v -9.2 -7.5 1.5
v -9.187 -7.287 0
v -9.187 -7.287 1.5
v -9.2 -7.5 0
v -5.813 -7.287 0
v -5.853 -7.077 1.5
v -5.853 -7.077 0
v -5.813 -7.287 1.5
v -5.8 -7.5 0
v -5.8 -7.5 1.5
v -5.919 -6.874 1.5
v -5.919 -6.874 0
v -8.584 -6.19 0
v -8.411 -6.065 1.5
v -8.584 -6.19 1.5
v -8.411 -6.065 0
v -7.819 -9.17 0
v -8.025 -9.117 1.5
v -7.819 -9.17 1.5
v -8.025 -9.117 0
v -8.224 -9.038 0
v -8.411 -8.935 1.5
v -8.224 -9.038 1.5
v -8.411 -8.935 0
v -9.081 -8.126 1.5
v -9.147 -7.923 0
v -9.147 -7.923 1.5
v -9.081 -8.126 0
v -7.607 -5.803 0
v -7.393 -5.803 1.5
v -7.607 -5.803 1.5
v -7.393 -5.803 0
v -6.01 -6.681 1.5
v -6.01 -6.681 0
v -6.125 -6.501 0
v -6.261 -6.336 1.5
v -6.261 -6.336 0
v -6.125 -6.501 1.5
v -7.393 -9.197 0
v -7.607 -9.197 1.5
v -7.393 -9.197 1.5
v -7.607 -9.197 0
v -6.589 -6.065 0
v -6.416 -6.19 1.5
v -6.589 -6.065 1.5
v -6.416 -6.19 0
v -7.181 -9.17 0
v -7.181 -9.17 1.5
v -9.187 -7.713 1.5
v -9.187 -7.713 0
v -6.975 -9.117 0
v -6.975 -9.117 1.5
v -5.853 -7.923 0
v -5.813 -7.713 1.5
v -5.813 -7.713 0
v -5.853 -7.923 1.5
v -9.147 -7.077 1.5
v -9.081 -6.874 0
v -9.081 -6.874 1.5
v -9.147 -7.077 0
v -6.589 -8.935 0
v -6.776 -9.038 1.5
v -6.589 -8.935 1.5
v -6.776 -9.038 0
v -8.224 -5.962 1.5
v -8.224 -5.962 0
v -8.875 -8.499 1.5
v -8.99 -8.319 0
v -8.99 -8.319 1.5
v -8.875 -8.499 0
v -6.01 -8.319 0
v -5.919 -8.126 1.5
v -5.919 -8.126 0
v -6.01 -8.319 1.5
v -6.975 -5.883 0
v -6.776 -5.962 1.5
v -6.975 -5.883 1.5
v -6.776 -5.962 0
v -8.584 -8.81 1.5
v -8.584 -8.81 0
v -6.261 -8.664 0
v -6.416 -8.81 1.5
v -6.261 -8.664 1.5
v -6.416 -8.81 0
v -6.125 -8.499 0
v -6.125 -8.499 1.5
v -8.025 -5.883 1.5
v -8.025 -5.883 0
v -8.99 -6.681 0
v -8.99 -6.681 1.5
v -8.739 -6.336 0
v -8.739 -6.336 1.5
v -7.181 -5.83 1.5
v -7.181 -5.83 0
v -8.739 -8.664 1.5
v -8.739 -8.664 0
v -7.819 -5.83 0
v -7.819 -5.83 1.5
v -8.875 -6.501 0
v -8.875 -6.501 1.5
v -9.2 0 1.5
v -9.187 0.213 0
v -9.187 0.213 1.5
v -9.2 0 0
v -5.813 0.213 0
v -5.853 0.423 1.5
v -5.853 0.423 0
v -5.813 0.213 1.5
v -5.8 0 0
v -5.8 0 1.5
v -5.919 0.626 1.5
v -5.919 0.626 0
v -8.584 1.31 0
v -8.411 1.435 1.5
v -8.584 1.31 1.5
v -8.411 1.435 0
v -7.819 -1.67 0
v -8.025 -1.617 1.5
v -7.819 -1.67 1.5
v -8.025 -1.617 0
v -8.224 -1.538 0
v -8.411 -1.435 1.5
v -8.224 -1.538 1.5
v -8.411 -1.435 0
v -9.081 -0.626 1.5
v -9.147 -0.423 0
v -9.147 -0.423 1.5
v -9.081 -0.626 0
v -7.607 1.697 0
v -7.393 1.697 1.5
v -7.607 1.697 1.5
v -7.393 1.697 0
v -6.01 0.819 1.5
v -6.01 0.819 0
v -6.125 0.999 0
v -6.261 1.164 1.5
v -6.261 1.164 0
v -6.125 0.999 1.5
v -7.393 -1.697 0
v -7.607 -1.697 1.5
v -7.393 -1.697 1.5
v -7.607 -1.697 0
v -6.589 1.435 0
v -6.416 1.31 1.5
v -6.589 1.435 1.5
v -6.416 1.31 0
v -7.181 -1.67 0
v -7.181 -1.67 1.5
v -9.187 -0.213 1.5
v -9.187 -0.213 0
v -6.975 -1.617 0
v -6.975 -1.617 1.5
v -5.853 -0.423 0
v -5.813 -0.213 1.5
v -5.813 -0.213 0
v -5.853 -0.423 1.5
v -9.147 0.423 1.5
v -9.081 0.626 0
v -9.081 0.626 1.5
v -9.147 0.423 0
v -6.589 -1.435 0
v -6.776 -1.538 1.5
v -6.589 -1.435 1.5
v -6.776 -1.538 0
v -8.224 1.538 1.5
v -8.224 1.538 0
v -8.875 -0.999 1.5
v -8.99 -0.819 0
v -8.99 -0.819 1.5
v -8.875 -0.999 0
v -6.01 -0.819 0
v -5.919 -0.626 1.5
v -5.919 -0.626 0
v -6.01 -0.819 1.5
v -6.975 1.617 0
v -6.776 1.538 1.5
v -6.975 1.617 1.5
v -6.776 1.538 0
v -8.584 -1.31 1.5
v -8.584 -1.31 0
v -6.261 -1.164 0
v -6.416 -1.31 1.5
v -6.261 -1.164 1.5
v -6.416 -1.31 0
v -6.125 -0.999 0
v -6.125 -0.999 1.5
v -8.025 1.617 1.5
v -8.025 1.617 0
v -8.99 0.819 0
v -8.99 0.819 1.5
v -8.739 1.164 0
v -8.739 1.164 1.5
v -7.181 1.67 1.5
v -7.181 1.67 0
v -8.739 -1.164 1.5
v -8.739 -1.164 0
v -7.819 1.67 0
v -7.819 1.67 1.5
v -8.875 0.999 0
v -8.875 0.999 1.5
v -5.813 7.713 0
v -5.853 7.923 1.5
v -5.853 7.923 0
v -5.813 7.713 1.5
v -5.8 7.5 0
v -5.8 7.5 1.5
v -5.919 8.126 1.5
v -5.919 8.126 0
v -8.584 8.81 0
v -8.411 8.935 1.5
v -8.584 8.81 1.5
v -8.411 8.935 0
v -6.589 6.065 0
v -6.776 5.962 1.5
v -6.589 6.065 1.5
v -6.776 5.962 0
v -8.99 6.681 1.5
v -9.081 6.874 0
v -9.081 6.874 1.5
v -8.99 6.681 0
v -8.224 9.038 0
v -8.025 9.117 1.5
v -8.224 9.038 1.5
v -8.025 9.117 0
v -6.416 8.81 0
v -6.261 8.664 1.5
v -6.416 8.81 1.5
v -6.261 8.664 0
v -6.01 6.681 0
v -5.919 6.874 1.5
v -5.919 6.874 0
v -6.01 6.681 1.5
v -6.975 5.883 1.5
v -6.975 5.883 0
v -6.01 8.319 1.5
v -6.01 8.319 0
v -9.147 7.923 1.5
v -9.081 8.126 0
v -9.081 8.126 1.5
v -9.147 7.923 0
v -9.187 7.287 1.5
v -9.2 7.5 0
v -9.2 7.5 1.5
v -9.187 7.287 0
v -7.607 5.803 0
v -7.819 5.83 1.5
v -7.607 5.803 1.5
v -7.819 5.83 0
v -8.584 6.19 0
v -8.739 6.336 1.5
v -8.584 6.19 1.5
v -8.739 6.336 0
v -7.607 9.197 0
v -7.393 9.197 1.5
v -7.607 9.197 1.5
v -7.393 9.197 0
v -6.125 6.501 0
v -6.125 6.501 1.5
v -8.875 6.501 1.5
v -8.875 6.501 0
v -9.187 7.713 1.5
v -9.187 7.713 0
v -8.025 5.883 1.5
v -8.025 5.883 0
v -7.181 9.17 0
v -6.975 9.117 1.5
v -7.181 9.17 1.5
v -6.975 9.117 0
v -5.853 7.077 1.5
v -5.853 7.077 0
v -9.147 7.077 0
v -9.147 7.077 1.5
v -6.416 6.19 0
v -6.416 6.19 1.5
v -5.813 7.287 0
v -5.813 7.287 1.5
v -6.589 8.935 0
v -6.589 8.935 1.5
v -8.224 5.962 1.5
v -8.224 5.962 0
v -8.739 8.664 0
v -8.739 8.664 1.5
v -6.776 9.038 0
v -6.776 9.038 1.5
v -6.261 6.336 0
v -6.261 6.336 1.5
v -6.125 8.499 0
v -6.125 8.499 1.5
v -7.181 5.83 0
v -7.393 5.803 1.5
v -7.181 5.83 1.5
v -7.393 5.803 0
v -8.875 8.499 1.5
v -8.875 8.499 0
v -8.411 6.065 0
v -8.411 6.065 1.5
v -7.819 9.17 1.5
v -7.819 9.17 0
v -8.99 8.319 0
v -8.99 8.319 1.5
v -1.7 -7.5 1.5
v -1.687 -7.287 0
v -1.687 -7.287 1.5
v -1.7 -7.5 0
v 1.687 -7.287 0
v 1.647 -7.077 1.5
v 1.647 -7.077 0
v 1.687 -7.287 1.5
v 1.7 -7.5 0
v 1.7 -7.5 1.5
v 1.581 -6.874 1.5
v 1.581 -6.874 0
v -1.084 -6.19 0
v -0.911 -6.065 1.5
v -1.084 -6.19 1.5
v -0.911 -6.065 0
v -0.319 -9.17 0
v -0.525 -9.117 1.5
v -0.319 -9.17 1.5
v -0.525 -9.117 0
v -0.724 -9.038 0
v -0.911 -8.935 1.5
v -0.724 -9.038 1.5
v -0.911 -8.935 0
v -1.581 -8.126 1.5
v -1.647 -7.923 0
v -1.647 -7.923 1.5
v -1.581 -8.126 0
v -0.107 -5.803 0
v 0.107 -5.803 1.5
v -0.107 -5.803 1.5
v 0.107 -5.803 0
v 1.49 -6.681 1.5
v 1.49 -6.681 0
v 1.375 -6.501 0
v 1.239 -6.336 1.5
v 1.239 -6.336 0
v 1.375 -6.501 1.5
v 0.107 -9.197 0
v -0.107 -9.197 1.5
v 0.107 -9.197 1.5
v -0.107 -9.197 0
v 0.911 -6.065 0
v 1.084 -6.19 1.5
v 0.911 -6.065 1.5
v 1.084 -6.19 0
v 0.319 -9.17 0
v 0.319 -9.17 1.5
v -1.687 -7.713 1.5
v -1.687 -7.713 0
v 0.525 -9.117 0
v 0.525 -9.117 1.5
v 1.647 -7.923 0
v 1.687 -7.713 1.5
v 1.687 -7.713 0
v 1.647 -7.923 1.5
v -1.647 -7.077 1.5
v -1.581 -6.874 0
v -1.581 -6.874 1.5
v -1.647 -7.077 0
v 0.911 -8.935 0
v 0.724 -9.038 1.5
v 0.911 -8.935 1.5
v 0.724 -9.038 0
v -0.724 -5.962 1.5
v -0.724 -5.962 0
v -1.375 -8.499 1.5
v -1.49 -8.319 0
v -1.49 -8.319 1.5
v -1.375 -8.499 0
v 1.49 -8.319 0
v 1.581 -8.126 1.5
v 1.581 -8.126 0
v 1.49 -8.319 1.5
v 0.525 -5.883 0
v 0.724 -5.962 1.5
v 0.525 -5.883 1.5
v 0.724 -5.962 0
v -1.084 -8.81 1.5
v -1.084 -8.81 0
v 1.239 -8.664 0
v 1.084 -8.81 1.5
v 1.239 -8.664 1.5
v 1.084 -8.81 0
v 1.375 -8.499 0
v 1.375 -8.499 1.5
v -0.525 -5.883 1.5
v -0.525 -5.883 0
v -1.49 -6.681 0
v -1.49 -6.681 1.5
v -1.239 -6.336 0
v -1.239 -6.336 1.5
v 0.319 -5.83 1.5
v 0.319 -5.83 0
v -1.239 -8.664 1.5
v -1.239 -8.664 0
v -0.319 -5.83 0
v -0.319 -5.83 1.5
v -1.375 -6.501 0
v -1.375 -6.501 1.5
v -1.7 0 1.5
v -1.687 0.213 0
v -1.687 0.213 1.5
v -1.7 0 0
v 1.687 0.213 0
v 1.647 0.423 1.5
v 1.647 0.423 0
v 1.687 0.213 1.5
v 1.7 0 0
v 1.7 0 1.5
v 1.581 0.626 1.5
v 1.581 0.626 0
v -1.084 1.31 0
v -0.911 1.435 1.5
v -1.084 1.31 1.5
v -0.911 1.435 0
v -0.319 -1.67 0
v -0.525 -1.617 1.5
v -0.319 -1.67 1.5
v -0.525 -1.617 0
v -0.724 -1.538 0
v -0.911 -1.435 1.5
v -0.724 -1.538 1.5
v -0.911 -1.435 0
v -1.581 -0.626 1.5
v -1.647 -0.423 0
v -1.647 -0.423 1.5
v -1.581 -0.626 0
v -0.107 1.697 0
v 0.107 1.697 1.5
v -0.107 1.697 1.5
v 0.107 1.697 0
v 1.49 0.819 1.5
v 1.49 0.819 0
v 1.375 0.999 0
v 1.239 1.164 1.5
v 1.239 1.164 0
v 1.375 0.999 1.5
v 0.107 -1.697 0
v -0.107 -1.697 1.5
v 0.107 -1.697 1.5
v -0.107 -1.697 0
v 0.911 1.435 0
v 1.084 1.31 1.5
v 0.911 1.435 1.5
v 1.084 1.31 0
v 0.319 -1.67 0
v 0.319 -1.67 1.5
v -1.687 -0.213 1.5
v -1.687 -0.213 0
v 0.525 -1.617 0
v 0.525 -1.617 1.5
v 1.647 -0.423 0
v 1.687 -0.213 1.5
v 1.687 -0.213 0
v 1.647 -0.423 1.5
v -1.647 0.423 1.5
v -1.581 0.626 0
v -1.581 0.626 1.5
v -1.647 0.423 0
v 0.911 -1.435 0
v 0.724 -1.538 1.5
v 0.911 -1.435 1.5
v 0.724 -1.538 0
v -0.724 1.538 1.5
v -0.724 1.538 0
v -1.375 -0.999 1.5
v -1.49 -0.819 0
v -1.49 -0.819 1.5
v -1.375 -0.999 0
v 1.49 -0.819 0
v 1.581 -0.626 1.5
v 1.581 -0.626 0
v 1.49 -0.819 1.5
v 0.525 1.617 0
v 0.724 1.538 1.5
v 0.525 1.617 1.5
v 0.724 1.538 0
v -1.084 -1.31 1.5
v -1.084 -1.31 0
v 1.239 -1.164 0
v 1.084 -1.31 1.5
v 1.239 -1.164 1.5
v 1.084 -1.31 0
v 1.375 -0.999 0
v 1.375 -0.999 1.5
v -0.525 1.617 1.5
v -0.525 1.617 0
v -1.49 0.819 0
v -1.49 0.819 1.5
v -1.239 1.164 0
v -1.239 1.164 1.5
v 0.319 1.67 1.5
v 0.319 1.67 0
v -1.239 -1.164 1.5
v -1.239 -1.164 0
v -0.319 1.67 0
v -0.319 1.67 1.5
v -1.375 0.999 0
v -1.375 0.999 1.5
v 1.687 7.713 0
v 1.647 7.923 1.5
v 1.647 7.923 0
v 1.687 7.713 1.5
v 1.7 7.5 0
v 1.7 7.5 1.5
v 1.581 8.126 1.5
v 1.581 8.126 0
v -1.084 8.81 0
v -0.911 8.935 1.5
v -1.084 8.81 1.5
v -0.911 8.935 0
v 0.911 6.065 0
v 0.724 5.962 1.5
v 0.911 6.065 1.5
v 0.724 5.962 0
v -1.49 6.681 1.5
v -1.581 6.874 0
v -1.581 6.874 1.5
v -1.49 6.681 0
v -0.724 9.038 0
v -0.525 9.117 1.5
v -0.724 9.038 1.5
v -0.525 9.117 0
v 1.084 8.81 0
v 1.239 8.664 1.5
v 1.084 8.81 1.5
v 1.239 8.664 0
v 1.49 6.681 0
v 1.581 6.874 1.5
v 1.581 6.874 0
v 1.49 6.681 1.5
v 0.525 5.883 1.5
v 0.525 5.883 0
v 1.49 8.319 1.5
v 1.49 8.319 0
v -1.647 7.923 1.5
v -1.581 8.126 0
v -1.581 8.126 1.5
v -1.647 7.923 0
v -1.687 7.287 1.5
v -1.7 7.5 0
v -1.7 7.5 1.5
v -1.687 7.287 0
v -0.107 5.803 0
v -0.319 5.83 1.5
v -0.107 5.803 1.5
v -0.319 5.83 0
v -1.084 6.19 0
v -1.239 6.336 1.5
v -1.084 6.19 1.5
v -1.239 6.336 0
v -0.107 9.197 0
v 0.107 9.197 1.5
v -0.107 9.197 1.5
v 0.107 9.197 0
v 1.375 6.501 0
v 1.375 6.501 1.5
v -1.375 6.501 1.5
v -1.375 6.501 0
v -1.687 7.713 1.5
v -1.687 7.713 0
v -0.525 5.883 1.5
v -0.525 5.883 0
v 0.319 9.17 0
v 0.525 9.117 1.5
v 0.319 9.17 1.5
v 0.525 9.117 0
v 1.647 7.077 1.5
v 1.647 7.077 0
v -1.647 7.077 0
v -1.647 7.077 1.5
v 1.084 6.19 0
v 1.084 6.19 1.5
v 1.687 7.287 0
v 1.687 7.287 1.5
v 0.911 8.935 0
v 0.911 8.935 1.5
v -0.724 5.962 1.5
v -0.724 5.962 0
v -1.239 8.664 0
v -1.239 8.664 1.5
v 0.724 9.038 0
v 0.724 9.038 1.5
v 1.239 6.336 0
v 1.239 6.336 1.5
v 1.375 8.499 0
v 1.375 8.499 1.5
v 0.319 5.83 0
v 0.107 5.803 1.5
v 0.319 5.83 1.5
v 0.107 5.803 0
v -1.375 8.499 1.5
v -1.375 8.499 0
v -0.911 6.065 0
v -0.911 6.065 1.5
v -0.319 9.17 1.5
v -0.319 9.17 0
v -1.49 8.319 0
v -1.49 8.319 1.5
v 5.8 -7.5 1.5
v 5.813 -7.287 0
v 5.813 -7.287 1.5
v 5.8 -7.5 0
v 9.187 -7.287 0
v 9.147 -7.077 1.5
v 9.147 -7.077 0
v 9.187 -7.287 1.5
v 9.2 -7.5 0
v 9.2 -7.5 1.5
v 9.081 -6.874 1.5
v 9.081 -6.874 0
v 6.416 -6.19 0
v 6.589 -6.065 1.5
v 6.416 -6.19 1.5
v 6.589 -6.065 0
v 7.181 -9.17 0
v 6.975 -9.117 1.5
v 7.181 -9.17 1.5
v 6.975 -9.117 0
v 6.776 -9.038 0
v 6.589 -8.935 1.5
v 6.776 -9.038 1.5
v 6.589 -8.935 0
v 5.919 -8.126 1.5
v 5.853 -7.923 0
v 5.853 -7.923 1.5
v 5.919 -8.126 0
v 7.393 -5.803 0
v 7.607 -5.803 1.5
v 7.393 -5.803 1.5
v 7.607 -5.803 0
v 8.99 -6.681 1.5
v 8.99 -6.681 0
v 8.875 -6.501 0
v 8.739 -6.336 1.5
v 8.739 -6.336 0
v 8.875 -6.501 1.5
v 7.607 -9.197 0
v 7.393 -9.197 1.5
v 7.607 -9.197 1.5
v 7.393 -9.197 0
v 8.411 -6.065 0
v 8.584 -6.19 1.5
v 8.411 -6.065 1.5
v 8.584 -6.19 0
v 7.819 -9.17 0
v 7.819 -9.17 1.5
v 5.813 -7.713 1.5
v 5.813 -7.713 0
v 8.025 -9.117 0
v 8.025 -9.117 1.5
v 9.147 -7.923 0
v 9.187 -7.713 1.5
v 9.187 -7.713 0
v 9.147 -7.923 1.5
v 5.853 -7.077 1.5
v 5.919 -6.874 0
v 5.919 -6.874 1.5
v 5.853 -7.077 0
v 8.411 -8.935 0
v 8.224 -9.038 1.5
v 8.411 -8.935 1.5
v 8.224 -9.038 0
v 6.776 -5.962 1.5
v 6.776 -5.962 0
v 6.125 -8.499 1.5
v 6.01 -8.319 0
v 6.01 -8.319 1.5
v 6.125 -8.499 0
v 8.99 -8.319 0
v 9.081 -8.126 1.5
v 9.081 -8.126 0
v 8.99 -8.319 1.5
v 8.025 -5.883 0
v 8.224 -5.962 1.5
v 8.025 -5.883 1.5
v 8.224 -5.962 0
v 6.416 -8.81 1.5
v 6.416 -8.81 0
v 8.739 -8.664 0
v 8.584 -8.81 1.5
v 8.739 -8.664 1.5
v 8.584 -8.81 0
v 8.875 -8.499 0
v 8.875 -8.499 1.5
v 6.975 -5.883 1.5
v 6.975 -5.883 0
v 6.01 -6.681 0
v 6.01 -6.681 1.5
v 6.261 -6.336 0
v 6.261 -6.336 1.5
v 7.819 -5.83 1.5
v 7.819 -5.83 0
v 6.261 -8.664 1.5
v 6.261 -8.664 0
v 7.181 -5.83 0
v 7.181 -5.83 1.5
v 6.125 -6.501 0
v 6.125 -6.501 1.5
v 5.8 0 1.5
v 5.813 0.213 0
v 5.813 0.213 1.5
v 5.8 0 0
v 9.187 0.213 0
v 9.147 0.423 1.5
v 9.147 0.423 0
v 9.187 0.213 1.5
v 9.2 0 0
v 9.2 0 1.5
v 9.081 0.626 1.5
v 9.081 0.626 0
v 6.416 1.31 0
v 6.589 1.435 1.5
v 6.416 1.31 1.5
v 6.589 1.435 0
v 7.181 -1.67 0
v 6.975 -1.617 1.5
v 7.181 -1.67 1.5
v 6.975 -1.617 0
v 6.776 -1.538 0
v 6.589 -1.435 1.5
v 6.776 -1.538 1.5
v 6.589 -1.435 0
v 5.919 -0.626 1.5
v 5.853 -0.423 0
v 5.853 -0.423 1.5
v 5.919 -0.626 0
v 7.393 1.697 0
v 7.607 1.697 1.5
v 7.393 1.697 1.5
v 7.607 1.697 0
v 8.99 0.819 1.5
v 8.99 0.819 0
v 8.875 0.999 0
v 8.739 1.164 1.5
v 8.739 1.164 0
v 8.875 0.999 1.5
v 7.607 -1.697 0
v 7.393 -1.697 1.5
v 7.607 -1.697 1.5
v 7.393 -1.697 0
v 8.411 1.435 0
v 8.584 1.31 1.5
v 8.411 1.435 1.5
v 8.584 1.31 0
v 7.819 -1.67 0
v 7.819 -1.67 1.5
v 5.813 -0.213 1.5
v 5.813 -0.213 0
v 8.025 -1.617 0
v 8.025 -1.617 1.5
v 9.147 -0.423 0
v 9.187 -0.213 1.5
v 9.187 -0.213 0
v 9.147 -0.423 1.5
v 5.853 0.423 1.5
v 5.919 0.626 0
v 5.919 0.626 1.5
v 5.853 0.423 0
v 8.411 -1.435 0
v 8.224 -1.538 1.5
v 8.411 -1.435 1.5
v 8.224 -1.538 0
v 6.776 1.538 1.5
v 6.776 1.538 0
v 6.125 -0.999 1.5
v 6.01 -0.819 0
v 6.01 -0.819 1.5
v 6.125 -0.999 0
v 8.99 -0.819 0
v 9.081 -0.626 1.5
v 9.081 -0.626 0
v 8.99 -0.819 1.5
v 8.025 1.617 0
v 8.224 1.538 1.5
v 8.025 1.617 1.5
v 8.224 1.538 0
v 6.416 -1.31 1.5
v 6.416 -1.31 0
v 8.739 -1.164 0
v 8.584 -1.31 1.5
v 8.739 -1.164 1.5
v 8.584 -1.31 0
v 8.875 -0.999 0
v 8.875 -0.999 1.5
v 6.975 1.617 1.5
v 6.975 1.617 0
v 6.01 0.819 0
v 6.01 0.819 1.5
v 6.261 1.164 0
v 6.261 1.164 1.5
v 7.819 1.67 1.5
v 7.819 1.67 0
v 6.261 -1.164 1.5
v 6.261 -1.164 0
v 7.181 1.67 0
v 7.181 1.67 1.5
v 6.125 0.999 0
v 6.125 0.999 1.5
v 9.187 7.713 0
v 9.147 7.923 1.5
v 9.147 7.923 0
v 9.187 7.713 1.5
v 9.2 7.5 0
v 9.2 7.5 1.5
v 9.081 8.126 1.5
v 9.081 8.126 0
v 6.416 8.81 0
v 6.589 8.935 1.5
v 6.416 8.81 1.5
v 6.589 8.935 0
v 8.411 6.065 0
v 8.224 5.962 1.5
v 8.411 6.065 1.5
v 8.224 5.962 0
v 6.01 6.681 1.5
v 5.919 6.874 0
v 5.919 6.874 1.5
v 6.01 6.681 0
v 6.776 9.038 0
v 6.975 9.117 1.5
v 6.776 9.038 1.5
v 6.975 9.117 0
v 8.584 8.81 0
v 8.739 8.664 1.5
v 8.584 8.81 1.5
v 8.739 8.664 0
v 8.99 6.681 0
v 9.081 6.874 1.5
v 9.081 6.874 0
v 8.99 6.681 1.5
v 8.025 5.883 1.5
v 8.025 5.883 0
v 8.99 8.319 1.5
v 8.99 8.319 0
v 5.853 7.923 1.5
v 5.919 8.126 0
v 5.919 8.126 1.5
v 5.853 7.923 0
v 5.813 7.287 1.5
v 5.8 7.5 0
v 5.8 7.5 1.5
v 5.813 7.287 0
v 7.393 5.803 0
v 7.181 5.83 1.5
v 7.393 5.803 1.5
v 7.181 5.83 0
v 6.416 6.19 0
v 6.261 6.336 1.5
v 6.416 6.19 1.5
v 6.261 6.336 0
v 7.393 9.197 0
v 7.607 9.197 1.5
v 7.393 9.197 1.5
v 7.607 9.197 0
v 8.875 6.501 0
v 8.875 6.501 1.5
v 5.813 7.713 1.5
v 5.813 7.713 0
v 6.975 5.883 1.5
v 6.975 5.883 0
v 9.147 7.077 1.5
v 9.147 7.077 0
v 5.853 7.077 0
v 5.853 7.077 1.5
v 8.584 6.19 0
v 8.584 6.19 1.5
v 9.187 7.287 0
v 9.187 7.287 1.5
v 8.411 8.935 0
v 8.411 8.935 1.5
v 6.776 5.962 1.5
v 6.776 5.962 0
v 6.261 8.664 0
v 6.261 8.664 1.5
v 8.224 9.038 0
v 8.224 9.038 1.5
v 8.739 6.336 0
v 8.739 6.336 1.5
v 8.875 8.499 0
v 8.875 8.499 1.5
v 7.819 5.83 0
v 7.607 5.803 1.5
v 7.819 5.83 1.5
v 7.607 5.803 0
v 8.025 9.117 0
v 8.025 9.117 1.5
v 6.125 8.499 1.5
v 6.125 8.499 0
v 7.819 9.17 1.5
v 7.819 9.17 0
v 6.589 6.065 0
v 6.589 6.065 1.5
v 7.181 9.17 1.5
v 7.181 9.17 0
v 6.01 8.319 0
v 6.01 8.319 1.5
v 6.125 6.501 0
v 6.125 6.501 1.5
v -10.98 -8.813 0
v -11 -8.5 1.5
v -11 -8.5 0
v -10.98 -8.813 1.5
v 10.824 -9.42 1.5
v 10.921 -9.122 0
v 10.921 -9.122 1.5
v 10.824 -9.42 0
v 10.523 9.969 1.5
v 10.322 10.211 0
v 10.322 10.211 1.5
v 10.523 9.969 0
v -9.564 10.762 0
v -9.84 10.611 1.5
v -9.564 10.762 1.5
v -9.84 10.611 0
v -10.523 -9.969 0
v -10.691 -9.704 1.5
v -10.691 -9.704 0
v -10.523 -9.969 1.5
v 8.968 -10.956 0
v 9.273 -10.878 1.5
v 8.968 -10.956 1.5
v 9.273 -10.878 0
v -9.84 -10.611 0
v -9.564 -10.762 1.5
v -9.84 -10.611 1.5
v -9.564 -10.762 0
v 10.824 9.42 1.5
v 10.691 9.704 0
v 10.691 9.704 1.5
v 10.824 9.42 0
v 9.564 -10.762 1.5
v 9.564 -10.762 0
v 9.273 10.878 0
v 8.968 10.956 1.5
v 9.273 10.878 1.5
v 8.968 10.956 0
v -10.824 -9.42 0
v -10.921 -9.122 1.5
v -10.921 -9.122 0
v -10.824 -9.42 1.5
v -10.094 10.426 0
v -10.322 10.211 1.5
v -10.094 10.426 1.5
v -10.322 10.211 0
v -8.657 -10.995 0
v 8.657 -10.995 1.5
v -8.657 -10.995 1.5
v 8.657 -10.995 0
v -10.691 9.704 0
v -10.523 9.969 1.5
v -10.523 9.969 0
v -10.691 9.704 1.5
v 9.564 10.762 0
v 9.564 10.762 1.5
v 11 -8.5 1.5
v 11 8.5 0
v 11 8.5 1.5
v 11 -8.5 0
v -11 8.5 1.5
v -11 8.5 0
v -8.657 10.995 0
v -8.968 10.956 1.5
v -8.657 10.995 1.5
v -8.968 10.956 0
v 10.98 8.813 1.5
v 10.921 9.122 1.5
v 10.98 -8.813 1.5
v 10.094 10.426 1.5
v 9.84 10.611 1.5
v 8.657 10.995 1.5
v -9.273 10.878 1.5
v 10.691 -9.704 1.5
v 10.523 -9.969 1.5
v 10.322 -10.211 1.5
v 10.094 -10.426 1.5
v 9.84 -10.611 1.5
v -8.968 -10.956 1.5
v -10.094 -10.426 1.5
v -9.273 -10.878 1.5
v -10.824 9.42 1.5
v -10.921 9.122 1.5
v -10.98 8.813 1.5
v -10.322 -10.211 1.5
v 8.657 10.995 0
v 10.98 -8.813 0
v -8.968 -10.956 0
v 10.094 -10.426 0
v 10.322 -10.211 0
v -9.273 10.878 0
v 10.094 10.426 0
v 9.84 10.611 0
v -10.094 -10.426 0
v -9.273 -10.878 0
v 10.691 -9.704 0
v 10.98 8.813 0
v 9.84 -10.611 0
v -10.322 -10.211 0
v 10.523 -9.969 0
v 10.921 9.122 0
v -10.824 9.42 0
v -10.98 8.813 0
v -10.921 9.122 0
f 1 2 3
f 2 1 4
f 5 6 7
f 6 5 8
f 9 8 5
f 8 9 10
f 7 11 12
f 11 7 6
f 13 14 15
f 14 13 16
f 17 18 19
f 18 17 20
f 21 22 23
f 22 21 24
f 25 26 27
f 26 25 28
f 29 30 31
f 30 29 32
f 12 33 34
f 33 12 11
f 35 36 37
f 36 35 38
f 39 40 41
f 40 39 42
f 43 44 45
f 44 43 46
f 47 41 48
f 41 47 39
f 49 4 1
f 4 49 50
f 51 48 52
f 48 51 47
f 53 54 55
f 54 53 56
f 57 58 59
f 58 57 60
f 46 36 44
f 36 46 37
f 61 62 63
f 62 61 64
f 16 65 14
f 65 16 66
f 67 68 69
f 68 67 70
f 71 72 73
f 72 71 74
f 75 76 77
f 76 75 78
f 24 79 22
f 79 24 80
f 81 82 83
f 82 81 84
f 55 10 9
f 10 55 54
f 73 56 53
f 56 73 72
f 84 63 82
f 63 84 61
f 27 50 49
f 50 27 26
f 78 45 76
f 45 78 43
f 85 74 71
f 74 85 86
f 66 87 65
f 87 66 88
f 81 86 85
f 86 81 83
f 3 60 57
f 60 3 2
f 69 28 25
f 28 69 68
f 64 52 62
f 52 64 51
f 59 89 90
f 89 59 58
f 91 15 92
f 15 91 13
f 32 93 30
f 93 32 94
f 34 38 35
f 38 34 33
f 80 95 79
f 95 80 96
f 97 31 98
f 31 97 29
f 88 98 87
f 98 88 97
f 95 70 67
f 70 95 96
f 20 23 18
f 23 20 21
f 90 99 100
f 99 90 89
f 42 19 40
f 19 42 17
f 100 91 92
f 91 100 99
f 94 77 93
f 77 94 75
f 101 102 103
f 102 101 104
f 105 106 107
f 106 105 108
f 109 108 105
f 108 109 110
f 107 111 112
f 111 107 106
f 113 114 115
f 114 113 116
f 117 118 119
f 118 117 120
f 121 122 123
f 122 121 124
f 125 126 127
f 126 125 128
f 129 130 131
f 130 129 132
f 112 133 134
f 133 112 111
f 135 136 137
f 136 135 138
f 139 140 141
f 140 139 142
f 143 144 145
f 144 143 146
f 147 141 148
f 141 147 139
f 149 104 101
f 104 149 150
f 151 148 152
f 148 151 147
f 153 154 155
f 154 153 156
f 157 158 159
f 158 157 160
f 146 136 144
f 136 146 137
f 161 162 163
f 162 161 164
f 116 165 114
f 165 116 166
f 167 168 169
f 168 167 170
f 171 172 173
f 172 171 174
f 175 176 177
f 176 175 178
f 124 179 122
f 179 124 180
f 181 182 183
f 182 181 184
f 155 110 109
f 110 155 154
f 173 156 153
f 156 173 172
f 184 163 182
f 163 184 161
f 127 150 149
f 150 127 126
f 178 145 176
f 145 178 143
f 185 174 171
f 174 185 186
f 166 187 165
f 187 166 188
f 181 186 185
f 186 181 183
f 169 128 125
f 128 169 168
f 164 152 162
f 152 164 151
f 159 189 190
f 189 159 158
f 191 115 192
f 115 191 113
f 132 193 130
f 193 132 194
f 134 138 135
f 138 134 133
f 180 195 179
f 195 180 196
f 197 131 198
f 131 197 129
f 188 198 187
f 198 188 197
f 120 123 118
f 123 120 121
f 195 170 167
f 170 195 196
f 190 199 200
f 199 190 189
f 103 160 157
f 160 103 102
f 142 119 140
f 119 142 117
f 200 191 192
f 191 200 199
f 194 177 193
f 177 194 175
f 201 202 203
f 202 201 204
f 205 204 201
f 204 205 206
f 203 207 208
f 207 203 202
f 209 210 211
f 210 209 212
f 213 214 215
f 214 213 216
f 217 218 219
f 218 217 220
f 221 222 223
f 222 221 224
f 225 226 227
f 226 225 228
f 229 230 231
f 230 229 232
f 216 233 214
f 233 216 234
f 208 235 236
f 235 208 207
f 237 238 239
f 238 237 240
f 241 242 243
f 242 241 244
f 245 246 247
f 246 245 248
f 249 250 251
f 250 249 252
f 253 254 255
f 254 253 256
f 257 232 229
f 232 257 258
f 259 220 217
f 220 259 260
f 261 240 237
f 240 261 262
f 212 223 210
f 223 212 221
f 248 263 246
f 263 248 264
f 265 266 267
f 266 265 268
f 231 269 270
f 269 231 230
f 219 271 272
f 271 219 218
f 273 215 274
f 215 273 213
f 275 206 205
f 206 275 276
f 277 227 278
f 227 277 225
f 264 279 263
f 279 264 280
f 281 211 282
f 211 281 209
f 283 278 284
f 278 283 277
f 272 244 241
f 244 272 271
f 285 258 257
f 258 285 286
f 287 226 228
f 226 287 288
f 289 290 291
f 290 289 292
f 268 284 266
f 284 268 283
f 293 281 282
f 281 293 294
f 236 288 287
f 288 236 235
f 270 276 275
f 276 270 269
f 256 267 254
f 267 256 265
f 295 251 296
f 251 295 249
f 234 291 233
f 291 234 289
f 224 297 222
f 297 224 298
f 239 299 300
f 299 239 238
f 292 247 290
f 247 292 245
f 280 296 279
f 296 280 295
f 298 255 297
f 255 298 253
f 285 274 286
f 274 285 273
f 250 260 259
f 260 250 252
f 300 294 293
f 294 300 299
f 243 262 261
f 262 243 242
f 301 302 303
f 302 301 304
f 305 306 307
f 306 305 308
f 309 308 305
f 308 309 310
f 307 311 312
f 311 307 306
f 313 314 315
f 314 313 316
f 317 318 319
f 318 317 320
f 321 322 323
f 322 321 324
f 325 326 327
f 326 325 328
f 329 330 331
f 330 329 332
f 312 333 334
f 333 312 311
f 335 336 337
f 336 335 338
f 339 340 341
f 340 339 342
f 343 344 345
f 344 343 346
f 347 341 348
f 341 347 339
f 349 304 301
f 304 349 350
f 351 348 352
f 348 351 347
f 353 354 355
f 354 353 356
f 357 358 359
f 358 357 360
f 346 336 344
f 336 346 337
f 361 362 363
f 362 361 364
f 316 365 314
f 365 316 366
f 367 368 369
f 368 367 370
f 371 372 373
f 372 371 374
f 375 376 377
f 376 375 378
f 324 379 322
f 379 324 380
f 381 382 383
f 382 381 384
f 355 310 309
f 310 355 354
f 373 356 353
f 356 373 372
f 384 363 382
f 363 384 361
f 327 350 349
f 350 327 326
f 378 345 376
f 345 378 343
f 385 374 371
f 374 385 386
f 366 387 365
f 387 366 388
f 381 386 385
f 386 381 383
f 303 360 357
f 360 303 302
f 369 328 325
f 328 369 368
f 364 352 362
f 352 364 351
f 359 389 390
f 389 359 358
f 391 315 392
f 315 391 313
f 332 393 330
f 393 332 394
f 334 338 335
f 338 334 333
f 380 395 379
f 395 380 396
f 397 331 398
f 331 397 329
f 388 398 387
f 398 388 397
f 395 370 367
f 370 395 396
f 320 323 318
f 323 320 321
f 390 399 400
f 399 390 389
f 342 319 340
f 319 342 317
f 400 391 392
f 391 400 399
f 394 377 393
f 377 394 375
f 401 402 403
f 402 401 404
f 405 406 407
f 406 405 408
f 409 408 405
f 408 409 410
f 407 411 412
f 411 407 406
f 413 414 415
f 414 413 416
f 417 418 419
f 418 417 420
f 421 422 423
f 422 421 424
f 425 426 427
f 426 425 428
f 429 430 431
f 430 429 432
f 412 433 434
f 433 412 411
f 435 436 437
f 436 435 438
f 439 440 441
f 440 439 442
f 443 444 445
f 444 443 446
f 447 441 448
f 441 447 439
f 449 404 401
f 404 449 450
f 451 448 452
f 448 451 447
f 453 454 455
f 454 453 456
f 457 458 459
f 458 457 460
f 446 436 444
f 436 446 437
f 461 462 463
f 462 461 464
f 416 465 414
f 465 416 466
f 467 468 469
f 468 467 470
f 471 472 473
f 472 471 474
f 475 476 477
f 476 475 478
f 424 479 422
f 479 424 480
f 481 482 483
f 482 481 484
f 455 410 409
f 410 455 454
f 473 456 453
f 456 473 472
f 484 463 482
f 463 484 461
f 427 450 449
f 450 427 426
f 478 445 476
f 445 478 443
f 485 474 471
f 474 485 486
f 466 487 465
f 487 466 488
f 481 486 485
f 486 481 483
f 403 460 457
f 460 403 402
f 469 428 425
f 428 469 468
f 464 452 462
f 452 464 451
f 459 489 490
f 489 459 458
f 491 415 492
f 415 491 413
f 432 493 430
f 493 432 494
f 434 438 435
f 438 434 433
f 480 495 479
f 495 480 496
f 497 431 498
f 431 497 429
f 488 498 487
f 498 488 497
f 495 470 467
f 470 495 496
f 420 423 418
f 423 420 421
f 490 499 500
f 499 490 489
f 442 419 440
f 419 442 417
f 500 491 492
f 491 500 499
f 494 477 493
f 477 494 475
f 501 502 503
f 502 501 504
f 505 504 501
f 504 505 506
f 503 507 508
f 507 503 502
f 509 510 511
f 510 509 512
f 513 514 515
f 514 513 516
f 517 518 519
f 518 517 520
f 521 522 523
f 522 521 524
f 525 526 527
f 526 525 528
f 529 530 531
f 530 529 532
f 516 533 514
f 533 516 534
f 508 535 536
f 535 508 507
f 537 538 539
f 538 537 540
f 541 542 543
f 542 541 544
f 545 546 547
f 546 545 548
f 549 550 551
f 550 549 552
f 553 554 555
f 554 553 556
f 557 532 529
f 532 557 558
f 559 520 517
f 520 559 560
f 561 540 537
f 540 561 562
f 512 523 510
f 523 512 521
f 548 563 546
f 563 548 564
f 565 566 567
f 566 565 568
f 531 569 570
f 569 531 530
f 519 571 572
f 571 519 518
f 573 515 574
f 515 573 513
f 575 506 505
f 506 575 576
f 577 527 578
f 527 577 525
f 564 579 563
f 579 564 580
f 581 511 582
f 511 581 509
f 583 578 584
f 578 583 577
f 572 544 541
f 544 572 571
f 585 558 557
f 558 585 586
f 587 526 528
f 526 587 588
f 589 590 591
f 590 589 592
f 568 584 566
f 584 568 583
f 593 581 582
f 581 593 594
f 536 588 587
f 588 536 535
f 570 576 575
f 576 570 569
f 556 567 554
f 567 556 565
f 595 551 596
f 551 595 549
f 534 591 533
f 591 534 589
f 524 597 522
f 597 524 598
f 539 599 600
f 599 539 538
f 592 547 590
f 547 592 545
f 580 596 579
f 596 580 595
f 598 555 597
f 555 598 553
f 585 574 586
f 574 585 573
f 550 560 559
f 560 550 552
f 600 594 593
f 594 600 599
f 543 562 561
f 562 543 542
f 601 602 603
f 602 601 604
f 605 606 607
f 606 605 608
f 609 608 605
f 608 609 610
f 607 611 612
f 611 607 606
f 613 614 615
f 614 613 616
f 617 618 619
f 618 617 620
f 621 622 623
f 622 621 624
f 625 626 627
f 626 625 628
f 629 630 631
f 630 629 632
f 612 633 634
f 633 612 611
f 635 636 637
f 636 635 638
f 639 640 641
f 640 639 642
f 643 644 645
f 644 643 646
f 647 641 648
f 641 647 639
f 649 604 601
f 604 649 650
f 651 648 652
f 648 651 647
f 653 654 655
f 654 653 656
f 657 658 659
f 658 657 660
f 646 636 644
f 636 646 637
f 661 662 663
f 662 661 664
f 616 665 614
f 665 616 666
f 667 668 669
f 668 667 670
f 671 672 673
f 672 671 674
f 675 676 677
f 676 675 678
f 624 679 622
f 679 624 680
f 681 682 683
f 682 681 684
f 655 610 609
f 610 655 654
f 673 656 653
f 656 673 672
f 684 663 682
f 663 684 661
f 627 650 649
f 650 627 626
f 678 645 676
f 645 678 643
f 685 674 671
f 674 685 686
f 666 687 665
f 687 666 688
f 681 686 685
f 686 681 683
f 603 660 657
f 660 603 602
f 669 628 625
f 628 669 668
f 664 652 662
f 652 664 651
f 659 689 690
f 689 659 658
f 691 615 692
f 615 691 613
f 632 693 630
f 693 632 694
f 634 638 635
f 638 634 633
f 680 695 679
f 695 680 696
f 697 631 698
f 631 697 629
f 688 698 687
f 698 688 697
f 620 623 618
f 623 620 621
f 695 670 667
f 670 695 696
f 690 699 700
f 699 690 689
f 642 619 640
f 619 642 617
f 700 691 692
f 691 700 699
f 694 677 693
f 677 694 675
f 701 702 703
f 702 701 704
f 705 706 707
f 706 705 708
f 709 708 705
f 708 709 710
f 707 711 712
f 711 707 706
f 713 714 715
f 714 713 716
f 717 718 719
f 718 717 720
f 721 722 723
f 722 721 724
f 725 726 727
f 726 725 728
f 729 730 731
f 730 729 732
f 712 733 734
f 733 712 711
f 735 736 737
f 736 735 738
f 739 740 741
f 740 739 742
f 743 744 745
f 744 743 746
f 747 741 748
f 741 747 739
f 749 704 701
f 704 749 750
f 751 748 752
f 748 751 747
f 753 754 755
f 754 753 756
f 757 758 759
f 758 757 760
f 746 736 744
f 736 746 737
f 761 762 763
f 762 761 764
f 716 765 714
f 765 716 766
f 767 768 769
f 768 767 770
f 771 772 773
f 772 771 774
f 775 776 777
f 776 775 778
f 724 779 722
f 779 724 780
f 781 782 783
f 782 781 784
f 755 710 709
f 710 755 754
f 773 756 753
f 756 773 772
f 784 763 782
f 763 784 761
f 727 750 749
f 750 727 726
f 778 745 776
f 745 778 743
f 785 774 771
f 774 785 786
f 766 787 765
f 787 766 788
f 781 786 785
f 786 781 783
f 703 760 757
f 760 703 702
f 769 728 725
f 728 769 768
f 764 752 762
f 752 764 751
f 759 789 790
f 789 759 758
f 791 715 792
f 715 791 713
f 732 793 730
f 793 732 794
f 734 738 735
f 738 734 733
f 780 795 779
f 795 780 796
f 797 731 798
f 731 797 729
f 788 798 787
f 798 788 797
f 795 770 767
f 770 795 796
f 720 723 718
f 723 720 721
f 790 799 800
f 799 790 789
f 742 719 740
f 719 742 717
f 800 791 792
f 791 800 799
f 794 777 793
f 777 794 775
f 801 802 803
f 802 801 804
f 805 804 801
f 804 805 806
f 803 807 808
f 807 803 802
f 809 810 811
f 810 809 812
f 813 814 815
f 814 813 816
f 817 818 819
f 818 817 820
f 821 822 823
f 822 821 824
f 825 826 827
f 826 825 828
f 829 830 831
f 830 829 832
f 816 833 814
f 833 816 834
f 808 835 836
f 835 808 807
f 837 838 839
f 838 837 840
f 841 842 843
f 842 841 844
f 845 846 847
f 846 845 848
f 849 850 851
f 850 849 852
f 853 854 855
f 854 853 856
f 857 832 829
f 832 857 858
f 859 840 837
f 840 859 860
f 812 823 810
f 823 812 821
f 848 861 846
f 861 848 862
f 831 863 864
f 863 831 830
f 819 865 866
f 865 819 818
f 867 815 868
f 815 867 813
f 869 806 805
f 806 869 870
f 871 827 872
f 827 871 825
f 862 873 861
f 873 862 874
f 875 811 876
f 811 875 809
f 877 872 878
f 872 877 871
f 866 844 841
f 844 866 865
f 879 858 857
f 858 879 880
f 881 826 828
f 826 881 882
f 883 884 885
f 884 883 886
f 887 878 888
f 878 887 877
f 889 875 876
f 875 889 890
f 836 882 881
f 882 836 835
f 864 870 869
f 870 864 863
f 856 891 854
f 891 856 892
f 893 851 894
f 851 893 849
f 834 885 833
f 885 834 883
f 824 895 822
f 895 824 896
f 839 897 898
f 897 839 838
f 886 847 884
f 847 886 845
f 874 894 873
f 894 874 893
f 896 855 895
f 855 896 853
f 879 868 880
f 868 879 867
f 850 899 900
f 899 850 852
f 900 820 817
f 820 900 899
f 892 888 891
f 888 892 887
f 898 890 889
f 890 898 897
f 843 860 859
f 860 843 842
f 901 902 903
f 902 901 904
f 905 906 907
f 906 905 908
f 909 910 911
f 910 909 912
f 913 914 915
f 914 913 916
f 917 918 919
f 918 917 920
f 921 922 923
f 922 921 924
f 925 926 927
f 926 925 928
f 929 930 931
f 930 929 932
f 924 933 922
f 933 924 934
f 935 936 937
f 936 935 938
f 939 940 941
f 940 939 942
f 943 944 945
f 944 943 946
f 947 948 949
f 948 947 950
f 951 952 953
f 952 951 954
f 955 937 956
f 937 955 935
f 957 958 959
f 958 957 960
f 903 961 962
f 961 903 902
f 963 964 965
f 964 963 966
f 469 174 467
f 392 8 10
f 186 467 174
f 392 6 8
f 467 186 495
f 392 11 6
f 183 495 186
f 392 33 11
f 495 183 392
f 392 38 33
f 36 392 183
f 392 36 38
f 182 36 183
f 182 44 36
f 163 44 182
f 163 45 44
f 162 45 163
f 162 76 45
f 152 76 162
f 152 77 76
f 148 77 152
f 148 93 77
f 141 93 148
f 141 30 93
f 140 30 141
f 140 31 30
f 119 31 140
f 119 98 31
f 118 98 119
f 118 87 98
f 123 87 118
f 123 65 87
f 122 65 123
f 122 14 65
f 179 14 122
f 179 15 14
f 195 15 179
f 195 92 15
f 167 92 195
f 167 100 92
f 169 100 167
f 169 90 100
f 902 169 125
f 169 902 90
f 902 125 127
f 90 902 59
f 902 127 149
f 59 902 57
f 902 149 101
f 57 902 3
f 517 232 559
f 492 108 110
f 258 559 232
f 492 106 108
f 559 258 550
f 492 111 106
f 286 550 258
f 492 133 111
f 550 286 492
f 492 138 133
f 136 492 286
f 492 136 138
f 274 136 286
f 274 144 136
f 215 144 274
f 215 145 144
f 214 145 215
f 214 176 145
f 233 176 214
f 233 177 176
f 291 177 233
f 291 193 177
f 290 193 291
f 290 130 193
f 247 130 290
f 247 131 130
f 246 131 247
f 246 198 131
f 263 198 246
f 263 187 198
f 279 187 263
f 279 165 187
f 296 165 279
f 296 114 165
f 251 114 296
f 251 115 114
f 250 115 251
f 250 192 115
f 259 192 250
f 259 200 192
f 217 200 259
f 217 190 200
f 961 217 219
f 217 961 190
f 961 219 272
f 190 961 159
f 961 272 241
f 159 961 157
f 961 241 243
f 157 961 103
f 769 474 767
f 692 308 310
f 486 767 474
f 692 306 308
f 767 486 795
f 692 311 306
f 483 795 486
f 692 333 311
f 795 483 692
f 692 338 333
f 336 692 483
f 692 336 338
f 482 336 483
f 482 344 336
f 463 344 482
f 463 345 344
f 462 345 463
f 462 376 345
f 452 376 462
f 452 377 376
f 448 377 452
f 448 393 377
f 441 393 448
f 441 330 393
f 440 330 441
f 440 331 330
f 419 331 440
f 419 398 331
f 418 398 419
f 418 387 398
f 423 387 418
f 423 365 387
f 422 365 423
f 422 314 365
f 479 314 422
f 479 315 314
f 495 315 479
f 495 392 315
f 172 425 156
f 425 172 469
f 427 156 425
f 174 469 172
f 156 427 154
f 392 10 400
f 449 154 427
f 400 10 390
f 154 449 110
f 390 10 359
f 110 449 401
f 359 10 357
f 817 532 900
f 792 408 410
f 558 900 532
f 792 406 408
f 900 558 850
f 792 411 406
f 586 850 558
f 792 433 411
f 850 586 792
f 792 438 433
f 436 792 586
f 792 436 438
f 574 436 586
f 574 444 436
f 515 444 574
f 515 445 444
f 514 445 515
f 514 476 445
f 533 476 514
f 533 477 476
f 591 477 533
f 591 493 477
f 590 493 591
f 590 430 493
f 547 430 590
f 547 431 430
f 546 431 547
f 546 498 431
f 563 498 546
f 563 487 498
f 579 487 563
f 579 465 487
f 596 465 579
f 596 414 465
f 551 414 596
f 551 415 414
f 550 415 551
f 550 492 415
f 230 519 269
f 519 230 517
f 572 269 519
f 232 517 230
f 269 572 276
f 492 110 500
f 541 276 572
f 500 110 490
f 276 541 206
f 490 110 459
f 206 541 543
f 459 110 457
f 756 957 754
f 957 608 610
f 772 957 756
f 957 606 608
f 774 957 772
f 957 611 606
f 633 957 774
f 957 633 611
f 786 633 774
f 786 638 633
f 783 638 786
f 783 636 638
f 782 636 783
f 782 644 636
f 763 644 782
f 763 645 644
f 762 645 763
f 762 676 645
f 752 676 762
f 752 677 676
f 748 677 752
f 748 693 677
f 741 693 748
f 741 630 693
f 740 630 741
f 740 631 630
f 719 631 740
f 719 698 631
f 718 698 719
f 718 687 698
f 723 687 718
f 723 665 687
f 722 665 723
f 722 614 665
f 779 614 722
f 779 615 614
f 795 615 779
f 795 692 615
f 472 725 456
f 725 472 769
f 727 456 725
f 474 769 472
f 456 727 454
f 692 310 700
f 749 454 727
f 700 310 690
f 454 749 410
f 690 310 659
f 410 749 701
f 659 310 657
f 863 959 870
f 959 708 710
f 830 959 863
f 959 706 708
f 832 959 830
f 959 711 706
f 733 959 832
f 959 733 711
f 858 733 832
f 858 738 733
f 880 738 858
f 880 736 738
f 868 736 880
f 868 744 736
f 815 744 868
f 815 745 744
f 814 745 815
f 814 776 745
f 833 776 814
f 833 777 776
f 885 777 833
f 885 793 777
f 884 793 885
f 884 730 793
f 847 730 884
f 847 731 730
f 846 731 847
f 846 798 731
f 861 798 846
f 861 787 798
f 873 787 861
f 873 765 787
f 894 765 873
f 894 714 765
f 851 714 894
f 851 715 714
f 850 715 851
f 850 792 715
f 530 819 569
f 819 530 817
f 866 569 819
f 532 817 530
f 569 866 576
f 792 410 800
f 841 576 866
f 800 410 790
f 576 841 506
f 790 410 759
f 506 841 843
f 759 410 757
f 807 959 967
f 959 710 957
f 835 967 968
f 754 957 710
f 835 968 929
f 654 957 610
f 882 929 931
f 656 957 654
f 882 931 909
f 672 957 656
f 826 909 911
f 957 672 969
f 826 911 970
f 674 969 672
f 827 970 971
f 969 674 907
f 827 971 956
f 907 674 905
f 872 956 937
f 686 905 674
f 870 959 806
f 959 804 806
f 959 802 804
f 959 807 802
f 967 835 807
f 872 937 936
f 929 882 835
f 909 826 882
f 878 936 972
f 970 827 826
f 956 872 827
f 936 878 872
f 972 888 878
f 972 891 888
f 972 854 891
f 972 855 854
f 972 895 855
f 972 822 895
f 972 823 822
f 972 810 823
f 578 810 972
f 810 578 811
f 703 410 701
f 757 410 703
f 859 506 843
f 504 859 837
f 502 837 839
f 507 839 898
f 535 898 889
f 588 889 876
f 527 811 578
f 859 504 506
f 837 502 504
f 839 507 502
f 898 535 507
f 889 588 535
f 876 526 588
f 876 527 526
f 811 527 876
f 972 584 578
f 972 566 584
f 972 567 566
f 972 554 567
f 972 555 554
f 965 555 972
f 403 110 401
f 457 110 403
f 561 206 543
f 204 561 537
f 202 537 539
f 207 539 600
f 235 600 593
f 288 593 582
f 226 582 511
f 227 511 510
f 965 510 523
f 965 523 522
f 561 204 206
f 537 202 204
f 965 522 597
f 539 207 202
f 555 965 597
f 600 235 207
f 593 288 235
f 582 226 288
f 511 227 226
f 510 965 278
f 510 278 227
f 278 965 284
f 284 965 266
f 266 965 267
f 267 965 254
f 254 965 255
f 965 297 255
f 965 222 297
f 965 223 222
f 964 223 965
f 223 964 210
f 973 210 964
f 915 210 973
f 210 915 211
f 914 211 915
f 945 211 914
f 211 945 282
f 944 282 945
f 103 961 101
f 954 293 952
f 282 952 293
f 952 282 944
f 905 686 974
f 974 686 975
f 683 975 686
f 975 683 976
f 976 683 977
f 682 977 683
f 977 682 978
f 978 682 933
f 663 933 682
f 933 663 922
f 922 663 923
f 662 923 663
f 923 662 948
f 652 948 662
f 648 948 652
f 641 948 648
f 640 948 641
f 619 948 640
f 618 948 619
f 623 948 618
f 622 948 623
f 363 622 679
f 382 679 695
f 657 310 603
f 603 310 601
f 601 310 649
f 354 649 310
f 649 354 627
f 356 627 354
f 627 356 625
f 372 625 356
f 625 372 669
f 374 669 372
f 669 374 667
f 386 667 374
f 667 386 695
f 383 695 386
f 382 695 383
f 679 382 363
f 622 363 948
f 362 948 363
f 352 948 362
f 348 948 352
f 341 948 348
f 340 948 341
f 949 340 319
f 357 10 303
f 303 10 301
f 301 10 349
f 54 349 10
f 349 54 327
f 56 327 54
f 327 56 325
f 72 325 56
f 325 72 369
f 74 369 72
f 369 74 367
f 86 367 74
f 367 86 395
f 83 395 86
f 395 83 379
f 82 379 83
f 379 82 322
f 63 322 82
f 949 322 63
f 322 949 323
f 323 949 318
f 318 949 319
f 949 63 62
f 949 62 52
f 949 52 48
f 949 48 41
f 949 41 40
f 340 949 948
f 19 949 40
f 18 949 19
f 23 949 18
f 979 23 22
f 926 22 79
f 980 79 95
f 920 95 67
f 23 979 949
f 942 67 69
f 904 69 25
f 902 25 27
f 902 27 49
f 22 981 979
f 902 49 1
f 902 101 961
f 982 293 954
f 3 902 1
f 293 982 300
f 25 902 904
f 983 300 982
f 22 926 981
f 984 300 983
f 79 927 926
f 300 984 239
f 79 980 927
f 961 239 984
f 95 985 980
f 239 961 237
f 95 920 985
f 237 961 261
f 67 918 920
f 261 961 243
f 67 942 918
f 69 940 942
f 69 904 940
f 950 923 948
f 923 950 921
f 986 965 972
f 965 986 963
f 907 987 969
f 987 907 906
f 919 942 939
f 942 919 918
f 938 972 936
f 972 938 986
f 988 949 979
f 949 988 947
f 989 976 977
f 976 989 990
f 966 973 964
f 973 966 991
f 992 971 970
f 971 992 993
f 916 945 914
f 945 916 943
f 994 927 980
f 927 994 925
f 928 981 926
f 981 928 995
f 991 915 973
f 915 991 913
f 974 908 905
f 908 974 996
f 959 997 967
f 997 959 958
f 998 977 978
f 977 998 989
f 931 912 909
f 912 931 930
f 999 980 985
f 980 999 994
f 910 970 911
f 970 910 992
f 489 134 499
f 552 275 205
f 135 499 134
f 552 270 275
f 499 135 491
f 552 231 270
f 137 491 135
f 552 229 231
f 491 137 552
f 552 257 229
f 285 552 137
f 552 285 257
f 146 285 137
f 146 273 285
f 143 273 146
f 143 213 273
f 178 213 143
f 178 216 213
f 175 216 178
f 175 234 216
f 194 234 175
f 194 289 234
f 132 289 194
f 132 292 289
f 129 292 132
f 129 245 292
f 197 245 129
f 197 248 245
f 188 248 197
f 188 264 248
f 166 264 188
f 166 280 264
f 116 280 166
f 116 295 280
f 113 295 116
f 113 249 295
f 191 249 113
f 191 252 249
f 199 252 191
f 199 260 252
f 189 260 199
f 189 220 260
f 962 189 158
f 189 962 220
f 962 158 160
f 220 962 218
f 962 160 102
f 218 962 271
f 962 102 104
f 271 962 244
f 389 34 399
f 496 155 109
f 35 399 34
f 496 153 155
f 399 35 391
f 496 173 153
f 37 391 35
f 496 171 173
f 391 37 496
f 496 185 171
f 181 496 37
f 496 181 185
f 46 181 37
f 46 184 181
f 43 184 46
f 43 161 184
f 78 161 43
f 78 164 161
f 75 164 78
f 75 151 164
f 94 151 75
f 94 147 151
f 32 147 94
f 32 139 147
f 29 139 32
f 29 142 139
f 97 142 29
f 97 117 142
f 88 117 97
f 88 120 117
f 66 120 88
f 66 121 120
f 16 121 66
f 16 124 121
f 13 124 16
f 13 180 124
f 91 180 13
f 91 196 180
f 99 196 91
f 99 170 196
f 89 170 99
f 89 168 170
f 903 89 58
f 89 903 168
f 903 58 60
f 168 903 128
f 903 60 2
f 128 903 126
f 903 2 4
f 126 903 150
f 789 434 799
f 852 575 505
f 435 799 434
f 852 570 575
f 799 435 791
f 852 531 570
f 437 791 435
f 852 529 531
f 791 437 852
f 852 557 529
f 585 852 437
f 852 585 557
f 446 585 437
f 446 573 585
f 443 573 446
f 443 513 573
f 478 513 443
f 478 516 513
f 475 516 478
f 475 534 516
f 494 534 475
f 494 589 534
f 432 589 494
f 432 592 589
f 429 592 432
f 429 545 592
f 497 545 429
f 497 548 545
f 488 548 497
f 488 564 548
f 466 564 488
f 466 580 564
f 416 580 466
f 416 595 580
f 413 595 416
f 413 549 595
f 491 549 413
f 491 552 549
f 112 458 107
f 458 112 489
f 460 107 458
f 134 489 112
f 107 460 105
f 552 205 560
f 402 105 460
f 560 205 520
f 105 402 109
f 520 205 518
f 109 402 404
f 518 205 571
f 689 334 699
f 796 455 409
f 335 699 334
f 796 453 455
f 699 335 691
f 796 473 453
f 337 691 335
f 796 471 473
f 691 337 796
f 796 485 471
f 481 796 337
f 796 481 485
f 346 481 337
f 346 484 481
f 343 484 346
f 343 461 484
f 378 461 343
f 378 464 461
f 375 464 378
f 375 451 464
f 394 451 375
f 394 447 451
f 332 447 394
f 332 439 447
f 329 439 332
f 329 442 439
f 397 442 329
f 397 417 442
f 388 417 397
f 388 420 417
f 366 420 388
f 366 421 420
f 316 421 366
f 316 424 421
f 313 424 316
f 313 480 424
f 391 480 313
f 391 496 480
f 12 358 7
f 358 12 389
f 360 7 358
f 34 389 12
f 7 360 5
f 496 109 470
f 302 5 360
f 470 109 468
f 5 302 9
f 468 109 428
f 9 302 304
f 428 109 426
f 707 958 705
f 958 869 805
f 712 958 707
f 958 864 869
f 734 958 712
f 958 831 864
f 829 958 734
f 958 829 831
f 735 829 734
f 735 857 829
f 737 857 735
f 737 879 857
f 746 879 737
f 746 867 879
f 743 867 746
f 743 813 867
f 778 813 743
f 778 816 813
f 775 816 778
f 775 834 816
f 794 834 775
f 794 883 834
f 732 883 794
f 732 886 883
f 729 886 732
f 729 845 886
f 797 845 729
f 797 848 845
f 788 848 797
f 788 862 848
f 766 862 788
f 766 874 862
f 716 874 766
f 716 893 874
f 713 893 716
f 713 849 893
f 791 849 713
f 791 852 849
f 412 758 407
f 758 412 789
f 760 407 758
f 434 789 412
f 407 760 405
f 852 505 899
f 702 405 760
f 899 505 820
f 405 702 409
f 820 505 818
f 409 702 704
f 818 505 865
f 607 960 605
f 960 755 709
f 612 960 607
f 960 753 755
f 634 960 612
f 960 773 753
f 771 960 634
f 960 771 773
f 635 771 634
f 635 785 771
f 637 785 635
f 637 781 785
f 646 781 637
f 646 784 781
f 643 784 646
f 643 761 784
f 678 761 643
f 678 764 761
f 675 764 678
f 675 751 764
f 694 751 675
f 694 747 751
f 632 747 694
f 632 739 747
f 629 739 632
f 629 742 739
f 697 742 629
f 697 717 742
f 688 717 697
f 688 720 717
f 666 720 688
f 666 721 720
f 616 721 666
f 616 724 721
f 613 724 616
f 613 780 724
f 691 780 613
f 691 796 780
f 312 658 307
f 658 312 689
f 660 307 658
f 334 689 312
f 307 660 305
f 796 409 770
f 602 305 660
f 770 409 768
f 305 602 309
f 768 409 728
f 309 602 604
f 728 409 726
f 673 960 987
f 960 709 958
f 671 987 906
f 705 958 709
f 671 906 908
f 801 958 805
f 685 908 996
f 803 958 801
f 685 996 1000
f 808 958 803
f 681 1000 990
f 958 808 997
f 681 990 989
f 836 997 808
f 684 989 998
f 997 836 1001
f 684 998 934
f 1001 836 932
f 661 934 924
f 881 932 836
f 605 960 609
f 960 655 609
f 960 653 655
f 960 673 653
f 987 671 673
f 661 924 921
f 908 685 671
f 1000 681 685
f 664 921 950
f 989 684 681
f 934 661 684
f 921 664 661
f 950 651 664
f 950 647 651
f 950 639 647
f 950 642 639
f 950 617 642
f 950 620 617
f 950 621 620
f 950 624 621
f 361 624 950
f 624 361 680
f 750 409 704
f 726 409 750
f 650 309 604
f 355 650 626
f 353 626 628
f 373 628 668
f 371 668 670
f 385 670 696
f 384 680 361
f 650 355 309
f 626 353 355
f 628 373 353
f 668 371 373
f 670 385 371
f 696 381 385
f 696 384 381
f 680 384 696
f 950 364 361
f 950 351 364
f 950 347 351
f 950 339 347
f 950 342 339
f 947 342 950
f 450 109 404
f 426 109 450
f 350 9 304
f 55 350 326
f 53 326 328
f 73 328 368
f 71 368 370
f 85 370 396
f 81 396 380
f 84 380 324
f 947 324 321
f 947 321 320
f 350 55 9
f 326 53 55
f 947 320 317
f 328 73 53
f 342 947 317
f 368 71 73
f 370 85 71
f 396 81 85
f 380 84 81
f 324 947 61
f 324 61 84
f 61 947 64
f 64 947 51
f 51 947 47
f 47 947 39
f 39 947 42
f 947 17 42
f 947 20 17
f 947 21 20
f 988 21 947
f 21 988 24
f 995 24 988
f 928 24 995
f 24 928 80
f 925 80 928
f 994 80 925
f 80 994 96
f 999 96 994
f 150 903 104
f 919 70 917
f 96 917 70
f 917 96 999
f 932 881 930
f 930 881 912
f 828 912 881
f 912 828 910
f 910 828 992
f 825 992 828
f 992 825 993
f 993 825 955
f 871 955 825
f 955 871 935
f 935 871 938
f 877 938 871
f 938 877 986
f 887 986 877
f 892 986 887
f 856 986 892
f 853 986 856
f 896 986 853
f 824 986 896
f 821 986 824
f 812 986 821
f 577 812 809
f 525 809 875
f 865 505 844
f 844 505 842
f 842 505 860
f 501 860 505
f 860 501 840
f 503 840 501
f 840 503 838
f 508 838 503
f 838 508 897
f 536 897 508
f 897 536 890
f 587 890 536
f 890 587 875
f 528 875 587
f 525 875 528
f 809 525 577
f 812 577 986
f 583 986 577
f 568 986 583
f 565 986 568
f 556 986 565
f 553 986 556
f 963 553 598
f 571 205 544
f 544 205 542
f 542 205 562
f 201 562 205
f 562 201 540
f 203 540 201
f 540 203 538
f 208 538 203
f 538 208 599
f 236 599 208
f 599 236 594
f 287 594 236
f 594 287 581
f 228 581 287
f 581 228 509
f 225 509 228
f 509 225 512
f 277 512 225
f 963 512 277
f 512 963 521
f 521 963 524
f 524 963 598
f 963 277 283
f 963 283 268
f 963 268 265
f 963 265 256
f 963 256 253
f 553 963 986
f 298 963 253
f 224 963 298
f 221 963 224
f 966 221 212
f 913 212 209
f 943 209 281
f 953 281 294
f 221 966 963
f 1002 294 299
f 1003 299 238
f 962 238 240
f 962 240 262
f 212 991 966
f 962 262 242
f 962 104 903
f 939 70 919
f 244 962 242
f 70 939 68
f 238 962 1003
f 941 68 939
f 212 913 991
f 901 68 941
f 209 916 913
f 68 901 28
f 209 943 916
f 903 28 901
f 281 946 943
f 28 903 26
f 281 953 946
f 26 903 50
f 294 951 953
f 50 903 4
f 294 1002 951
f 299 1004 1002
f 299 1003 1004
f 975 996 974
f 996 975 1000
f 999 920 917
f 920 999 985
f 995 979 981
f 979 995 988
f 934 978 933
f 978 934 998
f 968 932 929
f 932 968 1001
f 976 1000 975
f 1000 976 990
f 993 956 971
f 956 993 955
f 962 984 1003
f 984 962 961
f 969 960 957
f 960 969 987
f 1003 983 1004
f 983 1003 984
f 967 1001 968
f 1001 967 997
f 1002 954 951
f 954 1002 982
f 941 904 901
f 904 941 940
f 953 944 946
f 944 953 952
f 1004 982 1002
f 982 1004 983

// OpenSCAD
$fn = 50;


difference() {
	union() {
		translate(v = [0, 0, 0]) {
			rotate(a = [0, 0, 0]) {
				hull() {
					translate(v = [-8.5000000000, 8.5000000000, 0]) {
						rotate(a = [0, 0, 0]) {
							translate(v = [0, 0, 0]) {
								rotate(a = [0, 0, 0]) {
									cylinder(h = 1.5000000000, r = 2.5000000000);
								}
							}
						}
					}
					translate(v = [8.5000000000, 8.5000000000, 0]) {
						rotate(a = [0, 0, 0]) {
							translate(v = [0, 0, 0]) {
								rotate(a = [0, 0, 0]) {
									cylinder(h = 1.5000000000, r = 2.5000000000);
								}
							}
						}
					}
					translate(v = [-8.5000000000, -8.5000000000, 0]) {
						rotate(a = [0, 0, 0]) {
							translate(v = [0, 0, 0]) {
								rotate(a = [0, 0, 0]) {
									cylinder(h = 1.5000000000, r = 2.5000000000);
								}
							}
						}
					}
					translate(v = [8.5000000000, -8.5000000000, 0]) {
						rotate(a = [0, 0, 0]) {
							translate(v = [0, 0, 0]) {
								rotate(a = [0, 0, 0]) {
									cylinder(h = 1.5000000000, r = 2.5000000000);
								}
							}
						}
					}
				}
			}
		}
	}
	union() {
		translate(v = [-7.5000000000, -7.5000000000, 0]) {
			rotate(a = [0, 0, 0]) {
				translate(v = [0, 0, -50]) {
					rotate(a = [0, 0, 0]) {
						cylinder(h = 100, r = 1.7000000000);
					}
				}
			}
		}
		translate(v = [-7.5000000000, 0.0000000000, 0]) {
			rotate(a = [0, 0, 0]) {
				translate(v = [0, 0, -50]) {
					rotate(a = [0, 0, 0]) {
						cylinder(h = 100, r = 1.7000000000);
					}
				}
			}
		}
		translate(v = [-7.5000000000, 7.5000000000, 0]) {
			rotate(a = [0, 0, 0]) {
				translate(v = [0, 0, -50]) {
					rotate(a = [0, 0, 0]) {
						cylinder(h = 100, r = 1.7000000000);
					}
				}
			}
		}
		translate(v = [0.0000000000, -7.5000000000, 0]) {
			rotate(a = [0, 0, 0]) {
				translate(v = [0, 0, -50]) {
					rotate(a = [0, 0, 0]) {
						cylinder(h = 100, r = 1.7000000000);
					}
				}
			}
		}
		translate(v = [0.0000000000, 0.0000000000, 0]) {
			rotate(a = [0, 0, 0]) {
				translate(v = [0, 0, -50]) {
					rotate(a = [0, 0, 0]) {
						cylinder(h = 100, r = 1.7000000000);
					}
				}
			}
		}
		translate(v = [0.0000000000, 7.5000000000, 0]) {
			rotate(a = [0, 0, 0]) {
				translate(v = [0, 0, -50]) {
					rotate(a = [0, 0, 0]) {
						cylinder(h = 100, r = 1.7000000000);
					}
				}
			}
		}
		translate(v = [7.5000000000, -7.5000000000, 0]) {
			rotate(a = [0, 0, 0]) {
				translate(v = [0, 0, -50]) {
					rotate(a = [0, 0, 0]) {
						cylinder(h = 100, r = 1.7000000000);
					}
				}
			}
		}
		translate(v = [7.5000000000, 0.0000000000, 0]) {
			rotate(a = [0, 0, 0]) {
				translate(v = [0, 0, -50]) {
					rotate(a = [0, 0, 0]) {
						cylinder(h = 100, r = 1.7000000000);
					}
				}
			}
		}
		translate(v = [7.5000000000, 7.5000000000, 0]) {
			rotate(a = [0, 0, 0]) {
				translate(v = [0, 0, -50]) {
					rotate(a = [0, 0, 0]) {
						cylinder(h = 100, r = 1.7000000000);
					}
				}
			}
		}
	}
}
